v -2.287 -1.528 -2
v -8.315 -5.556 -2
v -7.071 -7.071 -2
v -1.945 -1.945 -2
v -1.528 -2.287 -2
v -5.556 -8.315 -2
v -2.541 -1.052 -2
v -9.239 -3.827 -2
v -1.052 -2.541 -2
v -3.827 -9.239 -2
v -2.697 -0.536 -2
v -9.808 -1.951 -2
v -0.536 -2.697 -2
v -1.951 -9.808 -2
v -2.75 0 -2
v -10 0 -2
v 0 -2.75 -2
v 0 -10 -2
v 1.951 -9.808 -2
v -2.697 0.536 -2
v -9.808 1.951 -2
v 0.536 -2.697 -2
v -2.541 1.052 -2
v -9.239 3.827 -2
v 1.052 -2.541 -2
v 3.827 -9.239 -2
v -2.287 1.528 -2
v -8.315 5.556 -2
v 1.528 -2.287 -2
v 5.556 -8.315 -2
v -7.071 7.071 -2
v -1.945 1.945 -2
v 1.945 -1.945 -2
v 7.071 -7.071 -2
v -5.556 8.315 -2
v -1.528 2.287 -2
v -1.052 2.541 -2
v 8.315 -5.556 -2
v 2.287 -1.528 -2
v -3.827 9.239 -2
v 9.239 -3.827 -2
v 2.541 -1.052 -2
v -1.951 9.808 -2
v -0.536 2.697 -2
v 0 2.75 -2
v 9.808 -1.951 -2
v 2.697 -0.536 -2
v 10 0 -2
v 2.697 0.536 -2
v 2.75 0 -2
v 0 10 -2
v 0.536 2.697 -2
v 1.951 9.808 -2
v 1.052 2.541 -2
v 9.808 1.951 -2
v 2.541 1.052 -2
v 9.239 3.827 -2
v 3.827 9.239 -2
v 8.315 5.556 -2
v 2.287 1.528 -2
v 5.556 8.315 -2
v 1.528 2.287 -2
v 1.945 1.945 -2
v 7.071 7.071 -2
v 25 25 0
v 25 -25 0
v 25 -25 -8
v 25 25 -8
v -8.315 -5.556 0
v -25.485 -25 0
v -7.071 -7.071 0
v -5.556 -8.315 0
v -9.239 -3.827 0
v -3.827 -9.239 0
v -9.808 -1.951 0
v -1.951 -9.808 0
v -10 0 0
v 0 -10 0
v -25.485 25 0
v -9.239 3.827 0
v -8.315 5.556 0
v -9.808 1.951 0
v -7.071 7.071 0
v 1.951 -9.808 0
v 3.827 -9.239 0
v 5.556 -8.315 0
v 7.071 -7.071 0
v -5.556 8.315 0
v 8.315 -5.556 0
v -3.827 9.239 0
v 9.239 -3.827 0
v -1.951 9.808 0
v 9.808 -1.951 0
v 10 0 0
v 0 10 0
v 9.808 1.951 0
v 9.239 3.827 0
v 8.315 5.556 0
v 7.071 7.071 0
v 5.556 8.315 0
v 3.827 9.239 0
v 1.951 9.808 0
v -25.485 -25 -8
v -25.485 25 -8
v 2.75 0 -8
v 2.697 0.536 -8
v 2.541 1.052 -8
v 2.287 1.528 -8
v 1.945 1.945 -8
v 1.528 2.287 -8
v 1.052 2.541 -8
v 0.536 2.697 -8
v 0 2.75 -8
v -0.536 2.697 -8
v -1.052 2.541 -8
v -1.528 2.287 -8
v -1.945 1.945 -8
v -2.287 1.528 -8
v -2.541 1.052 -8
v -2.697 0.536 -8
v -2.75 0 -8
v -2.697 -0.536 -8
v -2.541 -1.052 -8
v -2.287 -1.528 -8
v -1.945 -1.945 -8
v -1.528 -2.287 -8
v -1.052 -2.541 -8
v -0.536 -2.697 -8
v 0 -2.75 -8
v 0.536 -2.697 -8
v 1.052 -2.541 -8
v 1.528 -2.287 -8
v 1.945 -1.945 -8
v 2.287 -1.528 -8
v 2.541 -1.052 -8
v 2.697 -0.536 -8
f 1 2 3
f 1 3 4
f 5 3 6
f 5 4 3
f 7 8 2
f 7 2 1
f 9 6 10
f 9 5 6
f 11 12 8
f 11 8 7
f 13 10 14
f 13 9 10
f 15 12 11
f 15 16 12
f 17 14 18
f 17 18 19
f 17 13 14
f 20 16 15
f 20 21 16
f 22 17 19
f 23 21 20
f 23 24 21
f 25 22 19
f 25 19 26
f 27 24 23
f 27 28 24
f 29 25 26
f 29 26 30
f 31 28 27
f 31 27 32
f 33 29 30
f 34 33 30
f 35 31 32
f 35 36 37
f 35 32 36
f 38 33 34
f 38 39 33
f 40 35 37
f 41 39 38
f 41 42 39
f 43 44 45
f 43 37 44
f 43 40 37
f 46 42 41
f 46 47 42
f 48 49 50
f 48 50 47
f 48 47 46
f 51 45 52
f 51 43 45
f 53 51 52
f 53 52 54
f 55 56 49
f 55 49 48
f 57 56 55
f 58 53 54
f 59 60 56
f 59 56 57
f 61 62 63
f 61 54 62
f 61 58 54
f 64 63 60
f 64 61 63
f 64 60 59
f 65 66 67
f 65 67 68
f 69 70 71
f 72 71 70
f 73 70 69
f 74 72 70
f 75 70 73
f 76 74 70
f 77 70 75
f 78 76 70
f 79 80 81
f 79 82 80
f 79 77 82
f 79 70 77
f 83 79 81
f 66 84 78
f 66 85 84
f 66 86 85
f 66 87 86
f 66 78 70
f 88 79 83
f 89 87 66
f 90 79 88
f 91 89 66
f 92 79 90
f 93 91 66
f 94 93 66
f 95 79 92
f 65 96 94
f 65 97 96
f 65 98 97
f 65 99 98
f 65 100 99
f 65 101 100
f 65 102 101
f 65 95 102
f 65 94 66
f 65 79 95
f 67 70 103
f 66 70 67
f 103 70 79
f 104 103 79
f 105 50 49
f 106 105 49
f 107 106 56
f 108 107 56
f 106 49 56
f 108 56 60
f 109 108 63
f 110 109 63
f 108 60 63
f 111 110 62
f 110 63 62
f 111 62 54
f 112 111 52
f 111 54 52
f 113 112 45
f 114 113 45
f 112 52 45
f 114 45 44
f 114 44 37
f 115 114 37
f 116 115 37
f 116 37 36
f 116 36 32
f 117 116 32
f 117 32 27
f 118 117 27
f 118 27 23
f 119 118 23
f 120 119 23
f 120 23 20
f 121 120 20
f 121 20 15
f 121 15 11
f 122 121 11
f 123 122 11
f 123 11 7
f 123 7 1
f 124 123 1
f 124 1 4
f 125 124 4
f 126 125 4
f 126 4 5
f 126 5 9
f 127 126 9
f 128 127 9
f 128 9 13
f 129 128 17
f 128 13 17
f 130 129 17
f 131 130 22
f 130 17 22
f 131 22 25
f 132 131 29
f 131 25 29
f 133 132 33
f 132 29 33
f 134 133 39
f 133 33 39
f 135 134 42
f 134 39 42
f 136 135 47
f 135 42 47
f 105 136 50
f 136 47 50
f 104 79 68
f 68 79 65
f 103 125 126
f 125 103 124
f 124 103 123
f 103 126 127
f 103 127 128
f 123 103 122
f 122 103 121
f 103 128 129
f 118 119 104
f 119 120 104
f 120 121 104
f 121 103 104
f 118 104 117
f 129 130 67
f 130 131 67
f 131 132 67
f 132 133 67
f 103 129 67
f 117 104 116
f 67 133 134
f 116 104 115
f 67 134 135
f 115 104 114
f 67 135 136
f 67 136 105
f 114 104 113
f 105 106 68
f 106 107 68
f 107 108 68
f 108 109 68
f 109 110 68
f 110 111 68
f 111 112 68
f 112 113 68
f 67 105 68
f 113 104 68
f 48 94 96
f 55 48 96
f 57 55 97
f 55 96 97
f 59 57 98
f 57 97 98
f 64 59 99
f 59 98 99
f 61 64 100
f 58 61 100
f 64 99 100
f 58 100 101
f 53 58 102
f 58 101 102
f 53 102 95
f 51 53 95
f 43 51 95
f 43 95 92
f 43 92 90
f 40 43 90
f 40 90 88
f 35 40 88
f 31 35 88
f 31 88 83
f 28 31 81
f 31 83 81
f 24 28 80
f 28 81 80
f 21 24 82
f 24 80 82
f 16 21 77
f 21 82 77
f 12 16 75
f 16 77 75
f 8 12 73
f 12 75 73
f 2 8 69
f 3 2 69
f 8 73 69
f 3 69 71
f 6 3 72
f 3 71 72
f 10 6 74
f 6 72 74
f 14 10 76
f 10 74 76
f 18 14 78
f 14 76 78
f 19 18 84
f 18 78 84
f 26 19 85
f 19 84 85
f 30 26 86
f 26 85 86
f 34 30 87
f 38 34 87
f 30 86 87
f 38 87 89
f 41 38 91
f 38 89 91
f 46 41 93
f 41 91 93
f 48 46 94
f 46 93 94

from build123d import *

# Parameters (mm, degrees)
F0_W     = 50.484959
F0_H     = 50
F1_DEPTH = 8
F2_R     = 10
F3_DEPTH = 2
F4_R     = 2.75
F5_DEPTH = 6.001


with BuildPart() as f1:
    # F0 (on Top) → F1 (new body)
    with BuildSketch(Plane.XY):
        with Locations((-0.242479, 0)):
            Rectangle(F0_W, F0_H)
    extrude(amount=-F1_DEPTH)

    # F2 (on Top) → F3 (cut)
    with BuildSketch(Plane.XY):
        Circle(F2_R)
    extrude(amount=-F3_DEPTH, mode=Mode.SUBTRACT)

    # F4 (on face) → F5 (cut, through all)
    with BuildSketch(Plane.XY.offset(-2)):
        Circle(F4_R)
    extrude(amount=-F5_DEPTH, mode=Mode.SUBTRACT)


solid = f1.part
